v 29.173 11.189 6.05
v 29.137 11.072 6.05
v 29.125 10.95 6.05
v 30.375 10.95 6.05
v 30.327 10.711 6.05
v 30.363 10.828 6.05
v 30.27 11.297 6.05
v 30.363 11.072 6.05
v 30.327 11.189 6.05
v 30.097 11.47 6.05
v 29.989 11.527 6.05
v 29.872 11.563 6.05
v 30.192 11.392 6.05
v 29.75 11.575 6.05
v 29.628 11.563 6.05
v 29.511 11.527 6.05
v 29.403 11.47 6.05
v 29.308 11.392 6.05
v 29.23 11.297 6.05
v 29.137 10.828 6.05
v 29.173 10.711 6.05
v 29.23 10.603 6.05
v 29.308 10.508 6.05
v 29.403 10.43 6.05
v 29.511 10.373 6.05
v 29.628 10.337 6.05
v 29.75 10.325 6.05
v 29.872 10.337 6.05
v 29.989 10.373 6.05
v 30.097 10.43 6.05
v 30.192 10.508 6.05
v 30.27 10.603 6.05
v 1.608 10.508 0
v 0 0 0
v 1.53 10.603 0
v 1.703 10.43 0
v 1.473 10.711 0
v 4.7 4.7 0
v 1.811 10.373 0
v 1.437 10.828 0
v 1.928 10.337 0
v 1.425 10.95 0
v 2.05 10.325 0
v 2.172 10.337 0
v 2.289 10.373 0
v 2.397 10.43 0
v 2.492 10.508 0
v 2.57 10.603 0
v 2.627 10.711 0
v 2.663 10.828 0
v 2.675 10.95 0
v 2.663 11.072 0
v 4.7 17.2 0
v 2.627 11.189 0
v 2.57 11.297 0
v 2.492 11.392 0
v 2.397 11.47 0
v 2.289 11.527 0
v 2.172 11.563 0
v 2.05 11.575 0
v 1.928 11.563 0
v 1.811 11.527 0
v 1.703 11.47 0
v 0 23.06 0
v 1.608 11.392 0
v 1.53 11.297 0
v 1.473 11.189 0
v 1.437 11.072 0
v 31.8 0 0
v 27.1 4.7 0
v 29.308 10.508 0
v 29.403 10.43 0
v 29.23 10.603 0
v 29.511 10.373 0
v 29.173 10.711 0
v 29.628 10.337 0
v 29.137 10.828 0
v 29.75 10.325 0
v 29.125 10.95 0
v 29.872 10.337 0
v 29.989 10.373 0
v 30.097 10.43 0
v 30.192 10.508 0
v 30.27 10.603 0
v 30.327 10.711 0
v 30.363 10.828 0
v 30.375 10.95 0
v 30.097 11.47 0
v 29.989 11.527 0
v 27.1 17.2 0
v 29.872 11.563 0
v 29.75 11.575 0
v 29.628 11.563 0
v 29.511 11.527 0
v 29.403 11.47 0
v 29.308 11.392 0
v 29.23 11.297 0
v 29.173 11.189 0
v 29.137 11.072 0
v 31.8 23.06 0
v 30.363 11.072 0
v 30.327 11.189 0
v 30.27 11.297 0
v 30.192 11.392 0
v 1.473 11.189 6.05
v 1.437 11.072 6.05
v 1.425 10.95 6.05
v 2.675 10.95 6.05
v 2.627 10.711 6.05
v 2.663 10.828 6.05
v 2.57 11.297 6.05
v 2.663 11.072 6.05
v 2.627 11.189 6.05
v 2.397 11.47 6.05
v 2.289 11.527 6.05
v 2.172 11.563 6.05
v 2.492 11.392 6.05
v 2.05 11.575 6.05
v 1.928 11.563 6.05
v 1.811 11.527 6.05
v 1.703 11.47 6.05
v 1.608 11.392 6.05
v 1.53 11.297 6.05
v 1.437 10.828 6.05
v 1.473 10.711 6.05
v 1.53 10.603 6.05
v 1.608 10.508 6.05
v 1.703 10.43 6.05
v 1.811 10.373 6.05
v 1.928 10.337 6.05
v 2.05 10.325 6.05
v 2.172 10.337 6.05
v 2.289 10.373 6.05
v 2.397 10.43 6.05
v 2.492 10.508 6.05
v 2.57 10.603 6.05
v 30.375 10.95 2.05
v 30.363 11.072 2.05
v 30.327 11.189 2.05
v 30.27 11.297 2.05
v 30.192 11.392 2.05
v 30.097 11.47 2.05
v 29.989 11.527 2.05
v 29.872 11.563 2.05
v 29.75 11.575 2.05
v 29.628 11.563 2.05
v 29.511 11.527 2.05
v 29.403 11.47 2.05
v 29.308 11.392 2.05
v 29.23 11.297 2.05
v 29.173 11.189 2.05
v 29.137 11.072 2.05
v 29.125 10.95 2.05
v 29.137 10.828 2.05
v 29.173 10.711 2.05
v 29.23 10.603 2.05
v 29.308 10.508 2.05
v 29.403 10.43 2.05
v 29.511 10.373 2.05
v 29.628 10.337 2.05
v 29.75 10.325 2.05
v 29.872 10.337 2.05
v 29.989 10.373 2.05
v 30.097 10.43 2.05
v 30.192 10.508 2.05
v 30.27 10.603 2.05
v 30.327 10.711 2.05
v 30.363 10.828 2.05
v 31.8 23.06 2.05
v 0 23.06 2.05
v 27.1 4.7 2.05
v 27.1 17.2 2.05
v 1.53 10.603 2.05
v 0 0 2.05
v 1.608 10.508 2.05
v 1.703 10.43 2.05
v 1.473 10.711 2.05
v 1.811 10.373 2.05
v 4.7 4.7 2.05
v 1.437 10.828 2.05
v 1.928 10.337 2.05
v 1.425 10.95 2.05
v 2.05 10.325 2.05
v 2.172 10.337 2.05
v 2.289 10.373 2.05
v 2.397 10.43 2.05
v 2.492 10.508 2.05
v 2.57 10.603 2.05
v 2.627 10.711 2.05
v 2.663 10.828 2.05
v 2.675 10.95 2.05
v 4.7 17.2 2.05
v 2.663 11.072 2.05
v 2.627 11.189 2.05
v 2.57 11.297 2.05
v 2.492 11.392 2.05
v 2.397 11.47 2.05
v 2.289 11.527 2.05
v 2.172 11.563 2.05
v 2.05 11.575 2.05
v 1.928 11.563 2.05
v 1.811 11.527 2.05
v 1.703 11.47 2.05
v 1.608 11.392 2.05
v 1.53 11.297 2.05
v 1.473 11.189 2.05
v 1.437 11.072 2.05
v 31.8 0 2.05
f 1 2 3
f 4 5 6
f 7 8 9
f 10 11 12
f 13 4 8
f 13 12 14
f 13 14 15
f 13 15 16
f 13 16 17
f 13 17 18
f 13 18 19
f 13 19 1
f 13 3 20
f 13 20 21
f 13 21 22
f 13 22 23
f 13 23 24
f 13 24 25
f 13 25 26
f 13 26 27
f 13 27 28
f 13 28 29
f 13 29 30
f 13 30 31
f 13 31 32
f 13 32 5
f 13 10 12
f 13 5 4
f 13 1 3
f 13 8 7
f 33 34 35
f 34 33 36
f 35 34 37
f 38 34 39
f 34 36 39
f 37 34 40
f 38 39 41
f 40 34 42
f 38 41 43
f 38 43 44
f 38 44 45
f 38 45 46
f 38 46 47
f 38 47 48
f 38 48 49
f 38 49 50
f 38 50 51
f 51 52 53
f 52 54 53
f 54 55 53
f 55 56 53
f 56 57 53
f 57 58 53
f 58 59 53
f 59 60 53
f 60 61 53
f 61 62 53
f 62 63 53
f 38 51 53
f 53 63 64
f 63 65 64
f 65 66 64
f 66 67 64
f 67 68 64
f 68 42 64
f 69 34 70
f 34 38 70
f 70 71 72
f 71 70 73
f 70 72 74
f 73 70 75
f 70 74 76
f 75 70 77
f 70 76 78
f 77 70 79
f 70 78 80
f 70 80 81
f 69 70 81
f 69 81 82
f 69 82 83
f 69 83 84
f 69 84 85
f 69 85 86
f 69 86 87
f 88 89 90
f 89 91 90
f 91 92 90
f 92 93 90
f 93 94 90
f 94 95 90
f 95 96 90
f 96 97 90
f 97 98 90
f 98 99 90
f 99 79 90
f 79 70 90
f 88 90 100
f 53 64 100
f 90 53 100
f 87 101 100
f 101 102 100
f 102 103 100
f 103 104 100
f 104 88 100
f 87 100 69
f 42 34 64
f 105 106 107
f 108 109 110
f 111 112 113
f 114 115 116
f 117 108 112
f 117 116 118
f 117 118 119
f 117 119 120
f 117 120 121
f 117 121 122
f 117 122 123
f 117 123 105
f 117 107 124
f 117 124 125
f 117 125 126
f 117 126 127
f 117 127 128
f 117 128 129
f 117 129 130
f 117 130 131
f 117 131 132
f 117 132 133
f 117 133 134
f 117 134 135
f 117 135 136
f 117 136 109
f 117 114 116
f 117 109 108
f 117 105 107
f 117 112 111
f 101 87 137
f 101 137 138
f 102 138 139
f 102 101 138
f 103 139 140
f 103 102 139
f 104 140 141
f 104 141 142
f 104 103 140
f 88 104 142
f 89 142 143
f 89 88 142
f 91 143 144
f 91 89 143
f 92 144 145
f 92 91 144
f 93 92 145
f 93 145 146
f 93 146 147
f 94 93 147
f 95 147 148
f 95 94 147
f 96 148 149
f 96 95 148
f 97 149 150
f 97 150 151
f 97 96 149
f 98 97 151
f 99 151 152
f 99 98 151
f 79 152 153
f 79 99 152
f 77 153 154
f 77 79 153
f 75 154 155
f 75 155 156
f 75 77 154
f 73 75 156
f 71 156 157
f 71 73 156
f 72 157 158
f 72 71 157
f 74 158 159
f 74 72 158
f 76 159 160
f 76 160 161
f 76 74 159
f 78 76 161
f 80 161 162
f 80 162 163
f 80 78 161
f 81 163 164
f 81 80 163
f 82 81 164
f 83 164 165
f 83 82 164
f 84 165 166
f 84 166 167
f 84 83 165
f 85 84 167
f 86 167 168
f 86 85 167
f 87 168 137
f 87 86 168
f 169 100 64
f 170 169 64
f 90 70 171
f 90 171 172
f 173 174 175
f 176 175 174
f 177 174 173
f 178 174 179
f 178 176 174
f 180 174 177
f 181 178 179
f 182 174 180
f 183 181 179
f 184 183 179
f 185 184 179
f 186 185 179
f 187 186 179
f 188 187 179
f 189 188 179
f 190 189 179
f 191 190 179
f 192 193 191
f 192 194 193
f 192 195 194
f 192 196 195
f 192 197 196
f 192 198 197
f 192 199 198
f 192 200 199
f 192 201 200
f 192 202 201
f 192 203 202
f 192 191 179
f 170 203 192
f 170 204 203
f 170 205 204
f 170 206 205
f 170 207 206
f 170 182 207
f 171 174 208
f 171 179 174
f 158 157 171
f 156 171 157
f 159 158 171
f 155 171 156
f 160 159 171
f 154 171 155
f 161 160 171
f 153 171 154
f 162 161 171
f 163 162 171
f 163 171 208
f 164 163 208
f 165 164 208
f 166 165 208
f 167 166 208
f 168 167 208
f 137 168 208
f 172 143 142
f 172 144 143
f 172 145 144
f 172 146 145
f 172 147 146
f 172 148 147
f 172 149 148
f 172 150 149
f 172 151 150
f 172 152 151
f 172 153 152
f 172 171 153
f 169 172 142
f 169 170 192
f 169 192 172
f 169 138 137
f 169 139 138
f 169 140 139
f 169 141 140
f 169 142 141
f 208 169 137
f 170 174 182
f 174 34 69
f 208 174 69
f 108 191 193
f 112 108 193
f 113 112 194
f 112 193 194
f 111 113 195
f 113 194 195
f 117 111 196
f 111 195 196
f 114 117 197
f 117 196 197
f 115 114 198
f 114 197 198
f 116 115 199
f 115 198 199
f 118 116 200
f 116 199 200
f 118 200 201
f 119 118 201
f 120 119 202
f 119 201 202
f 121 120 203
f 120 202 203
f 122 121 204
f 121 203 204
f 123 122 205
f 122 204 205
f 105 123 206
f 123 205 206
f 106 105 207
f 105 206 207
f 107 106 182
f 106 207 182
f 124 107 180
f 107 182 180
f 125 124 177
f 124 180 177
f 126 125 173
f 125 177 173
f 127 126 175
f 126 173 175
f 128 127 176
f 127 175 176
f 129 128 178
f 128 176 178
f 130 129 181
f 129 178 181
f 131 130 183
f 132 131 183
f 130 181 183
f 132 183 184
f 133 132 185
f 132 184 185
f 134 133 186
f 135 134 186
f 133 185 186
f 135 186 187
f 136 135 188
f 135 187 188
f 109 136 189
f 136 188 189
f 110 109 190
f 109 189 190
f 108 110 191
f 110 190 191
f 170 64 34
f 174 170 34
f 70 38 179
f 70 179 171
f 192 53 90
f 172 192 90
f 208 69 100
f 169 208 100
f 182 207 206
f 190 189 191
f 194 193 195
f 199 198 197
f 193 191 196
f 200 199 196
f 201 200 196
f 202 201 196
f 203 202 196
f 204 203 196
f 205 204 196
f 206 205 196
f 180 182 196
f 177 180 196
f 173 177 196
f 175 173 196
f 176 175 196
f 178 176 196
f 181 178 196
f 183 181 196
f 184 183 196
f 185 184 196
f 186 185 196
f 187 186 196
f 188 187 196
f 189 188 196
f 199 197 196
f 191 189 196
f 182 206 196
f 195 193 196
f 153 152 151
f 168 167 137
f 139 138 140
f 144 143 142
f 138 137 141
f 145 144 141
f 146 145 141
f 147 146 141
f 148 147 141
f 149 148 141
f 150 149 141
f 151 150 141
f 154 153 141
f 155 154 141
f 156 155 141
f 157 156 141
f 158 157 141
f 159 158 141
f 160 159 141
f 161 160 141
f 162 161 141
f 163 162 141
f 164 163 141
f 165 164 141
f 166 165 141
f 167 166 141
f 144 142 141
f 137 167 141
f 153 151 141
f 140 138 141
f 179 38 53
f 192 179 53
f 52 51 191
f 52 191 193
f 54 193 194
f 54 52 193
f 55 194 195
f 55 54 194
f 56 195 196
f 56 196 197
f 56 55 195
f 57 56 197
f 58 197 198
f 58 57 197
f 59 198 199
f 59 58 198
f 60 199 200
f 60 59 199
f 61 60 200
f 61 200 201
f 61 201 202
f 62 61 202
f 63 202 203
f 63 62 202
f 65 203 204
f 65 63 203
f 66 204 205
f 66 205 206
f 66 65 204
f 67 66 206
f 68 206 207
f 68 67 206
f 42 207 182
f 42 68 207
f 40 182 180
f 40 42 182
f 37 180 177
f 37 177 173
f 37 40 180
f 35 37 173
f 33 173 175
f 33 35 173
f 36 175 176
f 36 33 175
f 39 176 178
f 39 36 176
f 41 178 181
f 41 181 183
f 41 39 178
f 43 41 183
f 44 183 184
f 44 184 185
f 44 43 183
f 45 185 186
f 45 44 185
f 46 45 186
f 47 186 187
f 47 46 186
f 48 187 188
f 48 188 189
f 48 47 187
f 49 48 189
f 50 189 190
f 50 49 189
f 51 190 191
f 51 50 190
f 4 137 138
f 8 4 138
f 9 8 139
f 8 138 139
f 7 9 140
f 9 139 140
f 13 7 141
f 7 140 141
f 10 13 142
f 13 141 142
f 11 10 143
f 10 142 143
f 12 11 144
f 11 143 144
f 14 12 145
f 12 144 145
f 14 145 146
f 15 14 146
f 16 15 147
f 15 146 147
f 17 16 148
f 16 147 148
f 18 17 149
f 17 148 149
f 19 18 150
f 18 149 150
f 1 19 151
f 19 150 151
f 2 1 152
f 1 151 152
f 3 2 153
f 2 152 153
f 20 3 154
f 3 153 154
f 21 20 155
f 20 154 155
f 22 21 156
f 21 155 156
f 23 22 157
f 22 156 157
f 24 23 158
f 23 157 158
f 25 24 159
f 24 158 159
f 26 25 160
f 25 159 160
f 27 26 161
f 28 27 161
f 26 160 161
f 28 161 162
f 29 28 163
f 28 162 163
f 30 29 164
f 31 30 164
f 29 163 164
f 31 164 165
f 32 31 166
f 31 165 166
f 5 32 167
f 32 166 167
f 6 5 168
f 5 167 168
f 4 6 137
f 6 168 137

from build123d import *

# Parameters (mm, degrees)
SKETCH1_R             = 0.625
SKETCH1_W             = 22.4
SKETCH1_H             = 12.5
BOSS_EXTRUDE1_DEPTH   = 2.05
SKETCH4_R             = 0.625
BOSS_EXTRUDE2_DEPTH   = 4
BOSS_EXTRUDE2_2_DEPTH = 4


with BuildPart() as part:
    # Sketch1 → Boss-Extrude1 (new body)
    with BuildSketch(Plane.XY):
        Polygon((0, 0), (31.8, 0), (31.8, 21.9), (31.8, 23.06), (0, 23.06), (0, 21.9), align=None)
        with Locations((29.75, 10.95)):
            Circle(SKETCH1_R, mode=Mode.SUBTRACT)
        with Locations((2.05, 10.95)):
            Circle(SKETCH1_R, mode=Mode.SUBTRACT)
        with Locations((15.9, 10.95)):
            Rectangle(SKETCH1_W, SKETCH1_H, mode=Mode.SUBTRACT)
    extrude(amount=BOSS_EXTRUDE1_DEPTH)


with BuildPart() as body_2:
    # Sketch4 → Boss-Extrude2 (new body)
    with BuildSketch(Plane.XY.offset(2.05)):
        with Locations((2.05, 10.95)):
            Circle(SKETCH4_R)
    extrude(amount=BOSS_EXTRUDE2_DEPTH)


with BuildPart() as body_3:
    # Sketch4 → Boss-Extrude2 2 (new body)
    with BuildSketch(Plane.XY.offset(2.05)):
        with Locations((29.75, 10.95)):
            Circle(SKETCH4_R)
    extrude(amount=BOSS_EXTRUDE2_2_DEPTH)


solid = Compound([part.part, body_2.part, body_3.part])
